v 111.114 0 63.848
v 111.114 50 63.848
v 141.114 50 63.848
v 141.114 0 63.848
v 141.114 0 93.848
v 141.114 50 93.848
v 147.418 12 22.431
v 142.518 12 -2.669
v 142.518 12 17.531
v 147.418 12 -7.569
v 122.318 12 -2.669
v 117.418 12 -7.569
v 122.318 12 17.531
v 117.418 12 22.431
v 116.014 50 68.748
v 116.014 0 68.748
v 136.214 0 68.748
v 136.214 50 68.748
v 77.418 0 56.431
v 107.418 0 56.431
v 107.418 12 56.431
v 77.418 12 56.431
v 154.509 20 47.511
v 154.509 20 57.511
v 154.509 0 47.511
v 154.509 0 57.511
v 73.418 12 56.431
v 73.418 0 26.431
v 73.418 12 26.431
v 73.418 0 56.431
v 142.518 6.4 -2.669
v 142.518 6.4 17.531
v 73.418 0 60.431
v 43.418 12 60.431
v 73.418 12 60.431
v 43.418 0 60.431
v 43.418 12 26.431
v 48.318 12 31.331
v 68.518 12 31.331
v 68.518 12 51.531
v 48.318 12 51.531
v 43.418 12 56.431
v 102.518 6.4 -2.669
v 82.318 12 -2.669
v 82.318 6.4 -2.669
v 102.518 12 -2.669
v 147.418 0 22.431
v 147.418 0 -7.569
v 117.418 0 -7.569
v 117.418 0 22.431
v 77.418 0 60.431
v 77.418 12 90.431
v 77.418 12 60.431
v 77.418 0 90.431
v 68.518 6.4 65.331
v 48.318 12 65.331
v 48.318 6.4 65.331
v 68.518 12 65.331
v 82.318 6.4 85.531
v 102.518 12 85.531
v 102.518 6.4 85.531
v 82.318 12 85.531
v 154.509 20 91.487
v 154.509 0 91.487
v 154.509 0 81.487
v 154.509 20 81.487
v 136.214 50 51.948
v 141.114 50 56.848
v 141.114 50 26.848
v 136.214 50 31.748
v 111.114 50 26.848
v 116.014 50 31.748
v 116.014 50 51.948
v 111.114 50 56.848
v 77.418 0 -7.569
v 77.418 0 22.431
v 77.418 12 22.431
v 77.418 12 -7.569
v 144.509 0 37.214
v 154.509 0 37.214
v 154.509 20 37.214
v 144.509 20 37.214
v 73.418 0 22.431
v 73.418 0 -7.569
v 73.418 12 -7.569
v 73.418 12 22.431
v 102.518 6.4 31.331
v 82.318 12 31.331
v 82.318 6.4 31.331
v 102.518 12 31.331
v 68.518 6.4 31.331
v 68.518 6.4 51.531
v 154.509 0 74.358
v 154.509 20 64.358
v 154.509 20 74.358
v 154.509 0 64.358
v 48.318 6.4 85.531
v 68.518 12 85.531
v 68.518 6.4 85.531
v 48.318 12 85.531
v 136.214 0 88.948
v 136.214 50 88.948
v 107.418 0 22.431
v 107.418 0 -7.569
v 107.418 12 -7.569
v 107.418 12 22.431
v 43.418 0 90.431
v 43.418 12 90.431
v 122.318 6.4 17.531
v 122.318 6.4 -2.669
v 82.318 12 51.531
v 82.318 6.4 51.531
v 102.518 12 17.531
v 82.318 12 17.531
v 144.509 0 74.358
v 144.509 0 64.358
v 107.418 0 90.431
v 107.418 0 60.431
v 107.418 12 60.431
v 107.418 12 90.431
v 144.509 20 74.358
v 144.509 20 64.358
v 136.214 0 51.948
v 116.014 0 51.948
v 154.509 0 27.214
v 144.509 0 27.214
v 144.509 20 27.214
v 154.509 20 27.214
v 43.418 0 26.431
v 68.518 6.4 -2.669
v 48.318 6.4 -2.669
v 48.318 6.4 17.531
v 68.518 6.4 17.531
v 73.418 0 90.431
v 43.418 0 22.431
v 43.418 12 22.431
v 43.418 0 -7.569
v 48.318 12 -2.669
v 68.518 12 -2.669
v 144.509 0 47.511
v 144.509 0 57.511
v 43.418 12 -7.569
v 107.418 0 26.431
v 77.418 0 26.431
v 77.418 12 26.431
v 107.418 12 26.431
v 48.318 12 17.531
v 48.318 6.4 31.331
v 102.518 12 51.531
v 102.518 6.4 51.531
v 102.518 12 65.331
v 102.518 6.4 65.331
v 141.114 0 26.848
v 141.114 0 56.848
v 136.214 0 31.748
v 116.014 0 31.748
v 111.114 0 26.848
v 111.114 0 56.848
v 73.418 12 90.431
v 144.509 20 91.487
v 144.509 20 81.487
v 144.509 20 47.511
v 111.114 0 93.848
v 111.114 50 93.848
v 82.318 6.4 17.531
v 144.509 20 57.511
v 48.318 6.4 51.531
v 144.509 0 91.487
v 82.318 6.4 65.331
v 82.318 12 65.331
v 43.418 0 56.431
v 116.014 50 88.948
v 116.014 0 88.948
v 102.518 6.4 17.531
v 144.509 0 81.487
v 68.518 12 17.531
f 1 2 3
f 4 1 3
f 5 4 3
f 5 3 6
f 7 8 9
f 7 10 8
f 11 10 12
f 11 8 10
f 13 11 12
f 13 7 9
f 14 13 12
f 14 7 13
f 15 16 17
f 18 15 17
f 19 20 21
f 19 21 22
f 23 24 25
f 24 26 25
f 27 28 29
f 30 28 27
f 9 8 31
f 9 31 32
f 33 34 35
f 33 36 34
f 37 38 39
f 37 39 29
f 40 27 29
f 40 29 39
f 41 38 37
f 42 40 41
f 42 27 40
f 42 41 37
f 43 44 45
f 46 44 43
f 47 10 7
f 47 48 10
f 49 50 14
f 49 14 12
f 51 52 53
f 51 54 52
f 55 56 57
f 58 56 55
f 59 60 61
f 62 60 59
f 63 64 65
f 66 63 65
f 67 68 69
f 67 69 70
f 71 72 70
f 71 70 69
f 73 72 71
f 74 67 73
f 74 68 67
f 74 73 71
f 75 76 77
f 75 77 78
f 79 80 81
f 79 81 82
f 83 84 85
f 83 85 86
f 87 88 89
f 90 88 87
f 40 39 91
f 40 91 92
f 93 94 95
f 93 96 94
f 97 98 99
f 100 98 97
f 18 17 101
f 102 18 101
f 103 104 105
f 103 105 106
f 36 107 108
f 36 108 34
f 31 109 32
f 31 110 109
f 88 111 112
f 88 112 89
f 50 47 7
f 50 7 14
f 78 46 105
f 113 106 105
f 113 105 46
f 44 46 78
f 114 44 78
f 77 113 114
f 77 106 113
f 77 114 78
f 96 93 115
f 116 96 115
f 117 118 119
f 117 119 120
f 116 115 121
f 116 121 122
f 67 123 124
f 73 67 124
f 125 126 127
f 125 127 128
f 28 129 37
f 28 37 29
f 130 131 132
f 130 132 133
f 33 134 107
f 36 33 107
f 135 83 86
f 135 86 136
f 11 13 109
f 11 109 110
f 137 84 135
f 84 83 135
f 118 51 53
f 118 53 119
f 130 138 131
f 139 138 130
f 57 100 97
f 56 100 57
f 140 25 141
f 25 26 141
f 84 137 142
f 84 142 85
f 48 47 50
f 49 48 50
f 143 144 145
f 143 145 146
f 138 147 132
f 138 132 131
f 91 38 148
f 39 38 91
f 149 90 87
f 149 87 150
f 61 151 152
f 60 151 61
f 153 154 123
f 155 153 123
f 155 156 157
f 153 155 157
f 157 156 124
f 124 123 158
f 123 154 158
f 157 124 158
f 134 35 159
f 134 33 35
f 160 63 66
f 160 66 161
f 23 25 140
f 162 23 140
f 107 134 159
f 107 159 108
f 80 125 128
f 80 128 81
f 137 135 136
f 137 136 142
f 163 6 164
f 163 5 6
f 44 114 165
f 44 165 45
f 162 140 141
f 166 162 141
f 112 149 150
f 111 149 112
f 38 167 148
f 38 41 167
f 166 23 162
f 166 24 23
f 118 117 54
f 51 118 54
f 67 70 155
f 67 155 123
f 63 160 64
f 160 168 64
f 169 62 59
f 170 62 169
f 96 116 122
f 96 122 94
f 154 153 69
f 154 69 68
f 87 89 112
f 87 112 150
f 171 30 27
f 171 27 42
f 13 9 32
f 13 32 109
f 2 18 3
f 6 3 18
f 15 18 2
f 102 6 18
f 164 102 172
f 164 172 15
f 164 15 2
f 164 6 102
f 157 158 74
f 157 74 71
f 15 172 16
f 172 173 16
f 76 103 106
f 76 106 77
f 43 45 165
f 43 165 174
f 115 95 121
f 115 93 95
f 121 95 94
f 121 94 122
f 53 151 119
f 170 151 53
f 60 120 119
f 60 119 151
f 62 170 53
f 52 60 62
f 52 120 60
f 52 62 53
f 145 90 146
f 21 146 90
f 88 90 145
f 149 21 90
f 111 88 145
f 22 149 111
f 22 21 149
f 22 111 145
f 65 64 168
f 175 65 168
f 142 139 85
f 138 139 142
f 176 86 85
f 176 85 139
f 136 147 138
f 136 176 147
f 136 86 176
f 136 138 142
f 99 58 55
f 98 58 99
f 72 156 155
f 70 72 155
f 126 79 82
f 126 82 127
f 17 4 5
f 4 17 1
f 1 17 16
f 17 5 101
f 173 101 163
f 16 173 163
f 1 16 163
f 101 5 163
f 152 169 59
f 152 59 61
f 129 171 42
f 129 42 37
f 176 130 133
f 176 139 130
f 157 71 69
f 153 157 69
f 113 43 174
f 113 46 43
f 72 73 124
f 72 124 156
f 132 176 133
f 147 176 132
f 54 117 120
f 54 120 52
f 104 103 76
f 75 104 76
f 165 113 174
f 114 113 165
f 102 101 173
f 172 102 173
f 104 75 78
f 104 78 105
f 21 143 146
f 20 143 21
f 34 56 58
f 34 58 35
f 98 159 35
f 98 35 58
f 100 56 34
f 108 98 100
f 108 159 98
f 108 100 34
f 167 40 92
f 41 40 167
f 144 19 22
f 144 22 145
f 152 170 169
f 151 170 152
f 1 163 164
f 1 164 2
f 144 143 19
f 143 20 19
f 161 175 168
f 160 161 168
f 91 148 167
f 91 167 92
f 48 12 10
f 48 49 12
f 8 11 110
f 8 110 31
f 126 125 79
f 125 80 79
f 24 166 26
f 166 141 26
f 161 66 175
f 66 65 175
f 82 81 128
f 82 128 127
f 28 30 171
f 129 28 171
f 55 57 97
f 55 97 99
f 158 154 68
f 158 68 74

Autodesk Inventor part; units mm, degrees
ref_plane "YZ Plane" through (0, 0, 0) normal (1, 0, 0) x (0, 1, 0)
ref_plane "XZ Plane" through (0, 0, 0) normal (0, 1, 0) x (-1, 0, 0)
ref_plane "XY Plane" through (0, 0, 0) normal (0, 0, 1) x (1, 0, 0)
sketch "草圖1" plane through (0, 0, 0) normal (0, 1, 0) x (-1, 0, 0)
  circle A0 centre (0, 0) radius 7
  circle A1 centre (0, 0) radius 11
  line L0 (0, 0) -> (-26.517, 0)
  line L1 (0, 0) -> (0, 28.4195)
  circle A2 centre (-26, 0) radius 7
  circle A3 centre (-26, 0) radius 11
  circle A4 centre (0, 26) radius 7
  circle A5 centre (0, 26) radius 11
  circle A6 centre (-26, 26) radius 7
  circle A7 centre (-26, 26) radius 11
  dimension "d0" = 14
  dimension "d1" = 22
  dimension "d6" = 26
  dimension "d9" = 26
sketch "草圖2" plane through (0, 0, 0) normal (0, 1, 0) x (-1, 0, 0)
  line L0 (-43.4184, -7.5692) -> (-73.4184, -7.5692)
  line L1 (-73.4184, -7.5692) -> (-73.4184, 22.4308)
  line L2 (-73.4184, 22.4308) -> (-43.4184, 22.4308)
  line L3 (-43.4184, 22.4308) -> (-43.4184, -7.5692)
  point P0 (0, 0)
  dimension "d14" = 30
  dimension "d15" = 30
extrude "擠出3" add sketch "草圖2" along normal blind 12
sketch "草圖3" plane through (0, 12, 0) normal (0, 1, 0) x (1, 0, 0)
  line L0 (73.4184, -22.4308) -> (73.4184, 7.5692) projected
  line L1 (73.4184, 7.5692) -> (41.0142, -24.4308)
  line L2 (73.4184, 7.5692) -> (43.4184, 7.5692) projected
  line L3 (43.4184, 7.5692) -> (73.4184, -22.4308)
  line L4 (48.3184, 2.6692) -> (68.5184, 2.6692)
  line L5 (68.5184, 2.6692) -> (68.5184, -17.5308)
  line L6 (68.5184, -17.5308) -> (48.3184, -17.5308)
  line L7 (48.3184, -17.5308) -> (48.3184, 2.6692)
  line L8 (48.3184, 2.6692) -> (68.5184, -17.5308) construction
  line L9 (68.5184, 2.6692) -> (48.3184, -17.5308) construction
  point P0 (0, 0)
  point P1 (58.4184, -7.4308)
  dimension "d18" = 20.2
  dimension "d19" = 20.2
extrude "擠出4" cut sketch "草圖3" against normal blind 5.6 contours L6 L7 L1 L3 | L3 L1 L4 L5 | L1 L3 L4 | L1 L7 L3
pattern_linear "矩形陣列1" count 2 spacing 34 along (1, 0, 0) count 3 spacing 34 along (0, 0, 1) of "擠出3", "擠出4"
sketch "草圖6" plane through (0, 0, 0) normal (0, 1, 0) x (-1, 0, 0)
  point P0 (0, 0)
sketch "草圖9" plane through (0, 0, 0) normal (0, 1, 0) x (-1, 0, 0)
  line L0 (-111.1142, 26.8484) -> (-141.1142, 26.8484)
  line L1 (-141.1142, 26.8484) -> (-141.1142, 56.8484)
  line L2 (-141.1142, 56.8484) -> (-111.1142, 56.8484)
  line L3 (-111.1142, 56.8484) -> (-111.1142, 26.8484)
  line L4 (-116.0142, 31.7484) -> (-136.2142, 31.7484)
  line L5 (-136.2142, 31.7484) -> (-136.2142, 51.9484)
  line L6 (-136.2142, 51.9484) -> (-116.0142, 51.9484)
  line L7 (-116.0142, 51.9484) -> (-116.0142, 31.7484)
  line L8 (-116.0142, 31.7484) -> (-136.2142, 51.9484) construction
  line L9 (-136.2142, 31.7484) -> (-116.0142, 51.9484) construction
  line L10 (-111.1142, 63.8484) -> (-141.1142, 63.8484)
  line L11 (-141.1142, 63.8484) -> (-141.1142, 93.8484)
  line L12 (-141.1142, 93.8484) -> (-111.1142, 93.8484)
  line L13 (-111.1142, 93.8484) -> (-111.1142, 63.8484)
  line L14 (-116.0142, 68.7484) -> (-136.2142, 68.7484)
  line L15 (-136.2142, 68.7484) -> (-136.2142, 88.9484)
  line L16 (-136.2142, 88.9484) -> (-116.0142, 88.9484)
  line L17 (-116.0142, 88.9484) -> (-116.0142, 68.7484)
  line L18 (-116.0142, 68.7484) -> (-136.2142, 88.9484) construction
  line L19 (-136.2142, 68.7484) -> (-116.0142, 88.9484) construction
  line L20 (-1.9445, 119.2719) -> (-33.9445, 119.2719)
  line L21 (-33.9445, 119.2719) -> (-33.9445, 151.2719)
  line L22 (-33.9445, 151.2719) -> (-1.9445, 151.2719)
  line L23 (-1.9445, 151.2719) -> (-1.9445, 119.2719)
  line L24 (-5.9445, 123.2719) -> (-29.9445, 123.2719)
  line L25 (-29.9445, 123.2719) -> (-29.9445, 147.2719)
  line L26 (-29.9445, 147.2719) -> (-5.9445, 147.2719)
  line L27 (-5.9445, 147.2719) -> (-5.9445, 123.2719)
  line L28 (-5.9445, 119.5982) -> (-29.9445, 143.5982) construction
  line L29 (-29.9445, 119.5982) -> (-5.9445, 143.5982) construction
  line L30 (35.5473, 81.3984) -> (3.5473, 81.3984)
  line L31 (3.5473, 81.3984) -> (3.5473, 113.3984)
  line L32 (3.5473, 113.3984) -> (35.5473, 113.3984)
  line L33 (35.5473, 113.3984) -> (35.5473, 81.3984)
  line L34 (31.5472, 85.3984) -> (7.5472, 85.3984)
  line L35 (7.5472, 85.3984) -> (7.5472, 109.3984)
  line L36 (7.5472, 109.3984) -> (31.5472, 109.3984)
  line L37 (31.5472, 109.3984) -> (31.5472, 85.3984)
  line L38 (31.5472, 85.3984) -> (7.5472, 109.3984) construction
  line L39 (7.5472, 85.3984) -> (31.5472, 109.3984) construction
  line L40 (34.8593, 41.843) -> (2.8593, 41.843)
  line L41 (30.8593, 45.843) -> (6.8593, 45.843)
  line L42 (6.8593, 45.843) -> (6.8593, 69.843)
  line L43 (2.8593, 41.843) -> (2.8593, 73.843)
  line L44 (6.8593, 69.843) -> (30.8593, 69.843)
  line L45 (30.8593, 45.843) -> (6.8593, 69.843) construction
  line L46 (6.8593, 45.843) -> (30.8593, 69.843) construction
  line L47 (2.8593, 73.843) -> (34.8593, 73.843)
  line L48 (30.8593, 69.843) -> (30.8593, 45.843)
  line L49 (34.8593, 73.843) -> (34.8593, 41.843)
  line L50 (35.5473, 117.4293) -> (3.5473, 117.4293)
  line L51 (31.5472, 121.4294) -> (7.5472, 121.4294)
  line L52 (7.5472, 121.4294) -> (7.5472, 145.4294)
  line L53 (3.5473, 117.4293) -> (3.5473, 149.4293)
  line L54 (7.5472, 145.4294) -> (31.5472, 145.4294)
  line L55 (31.5472, 121.4294) -> (7.5472, 145.4294) construction
  line L56 (7.5472, 121.4294) -> (31.5472, 145.4294) construction
  line L57 (3.5473, 149.4293) -> (35.5473, 149.4293)
  line L58 (31.5472, 145.4294) -> (31.5472, 121.4294)
  line L59 (35.5473, 149.4293) -> (35.5473, 117.4293)
  line L60 (-40.805, 141.4327) -> (-72.805, 141.4327)
  line L61 (-44.805, 145.4328) -> (-68.805, 145.4328)
  line L62 (-68.805, 145.4328) -> (-68.805, 169.4328)
  line L63 (-72.805, 141.4327) -> (-72.805, 173.4327)
  line L64 (-68.805, 169.4328) -> (-44.805, 169.4328)
  line L65 (-44.805, 145.4328) -> (-68.805, 169.4328) construction
  line L66 (-68.805, 145.4328) -> (-44.805, 169.4328) construction
  line L67 (-72.805, 173.4327) -> (-40.805, 173.4327)
  line L68 (-44.805, 169.4328) -> (-44.805, 145.4328)
  line L69 (-40.805, 173.4327) -> (-40.805, 141.4327)
  line L70 (-81.8163, 139.4435) -> (-113.8163, 139.4435)
  line L71 (-85.8164, 143.4436) -> (-109.8164, 143.4436)
  line L72 (-109.8164, 143.4436) -> (-109.8164, 167.4436)
  line L73 (-113.8163, 139.4435) -> (-113.8163, 171.4435)
  line L74 (-109.8164, 167.4436) -> (-85.8164, 167.4436)
  line L75 (-85.8164, 143.4436) -> (-109.8164, 167.4436) construction
  line L76 (-109.8164, 143.4436) -> (-85.8164, 167.4436) construction
  line L77 (-113.8163, 171.4435) -> (-81.8163, 171.4435)
  line L78 (-85.8164, 167.4436) -> (-85.8164, 143.4436)
  line L79 (-81.8163, 171.4435) -> (-81.8163, 139.4435)
  point P0 (0, 0)
  point P1 (-126.1142, 41.8484)
  point P2 (-126.1142, 78.8484)
  point P3 (-17.9445, 131.5982)
  point P4 (19.5472, 97.3984)
  point P5 (18.8593, 57.843)
  point P6 (19.5472, 133.4294)
  point P7 (-56.805, 157.4328)
  point P8 (-97.8164, 155.4436)
  dimension "d73" = 50.747
  dimension "d54" = 30
  dimension "d55" = 30
  dimension "d56" = 20.2
  dimension "d57" = 20.2
  dimension "d60" = 37
  dimension "d69" = 32
  dimension "d70" = 32
  dimension "d71" = 24
  dimension "d72" = 24
  dimension "d141" = 4.9
  dimension "d142" = 4.9
extrude "擠出9" add sketch "草圖9" along normal blind 50 contours L0 L1 L2 L3 | L10 L11 L12 L13
sketch "草圖10" plane through (0, 0, 0) normal (0, 1, 0) x (-1, 0, 0)
  line L0 (48.2716, 184.5725) -> (-274.6912, 184.5725)
  line L1 (-274.6912, 184.5725) -> (-274.6912, -18.9692)
  line L2 (-274.6912, -18.9692) -> (48.2716, -18.9692)
  line L3 (48.2716, -18.9692) -> (48.2716, 184.5725)
  line L4 (48.2716, -18.9692) -> (-71.7284, -18.9692)
  line L5 (-71.7284, -18.9692) -> (-71.7284, 101.0308)
  line L6 (-71.7284, 101.0308) -> (48.2716, 101.0308)
  line L7 (48.2716, 101.0308) -> (48.2716, -18.9692)
  line L8 (-71.7284, -18.9692) -> (-191.7284, -18.9692)
  line L9 (-191.7284, -18.9692) -> (-191.7284, 101.0308)
  line L10 (-191.7284, 101.0308) -> (-71.7284, 101.0308)
  line L11 (-71.7284, 101.0308) -> (-71.7284, -18.9692)
  point P0 (0, 0)
  dimension "d99" = 322.9628
  dimension "d100" = 203.5417
  dimension "d135" = 120
  dimension "d136" = 120
  dimension "d137" = 120
  dimension "d138" = 120
sketch "草圖11" plane through (0, 0, 0) normal (0, 1, 0) x (-1, 0, 0)
  line L0 (35.0654, 155.7952) -> (13.0654, 155.7952)
  line L1 (13.0654, 155.7952) -> (13.0654, 177.7952)
  line L2 (13.0654, 177.7952) -> (35.0654, 177.7952)
  line L3 (35.0654, 177.7952) -> (35.0654, 155.7952)
  line L4 (4.7905, 155.7952) -> (-17.2095, 155.7952)
  line L5 (-17.2095, 155.7952) -> (-17.2095, 177.7952)
  line L6 (-17.2095, 177.7952) -> (4.7905, 177.7952)
  line L7 (4.7905, 177.7952) -> (4.7905, 155.7952)
  point P0 (0, 0)
  dimension "d101" = 22
  dimension "d102" = 22
  dimension "d103" = 22
  dimension "d104" = 22
sketch "草圖12" plane through (0, 0, 0) normal (0, 1, 0) x (-1, 0, 0)
  line L0 (17.1987, 35.1037) -> (39.1987, 35.1037)
  line L1 (39.1987, 35.1037) -> (39.1987, 13.1037)
  line L2 (39.1987, 13.1037) -> (17.1987, 13.1037)
  line L3 (17.1987, 13.1037) -> (17.1987, 35.1037)
  line L4 (17.9153, 6.7257) -> (39.9153, 6.7257)
  line L5 (39.9153, 6.7257) -> (39.9153, -15.2743)
  line L6 (39.9153, -15.2743) -> (17.9153, -15.2743)
  line L7 (17.9153, -15.2743) -> (17.9153, 6.7257)
  point P0 (0, 0)
  dimension "d105" = 22
  dimension "d106" = 22
  dimension "d107" = 22
  dimension "d108" = 22
sketch "草圖14" plane through (0, 0, 0) normal (0, 1, 0) x (-1, 0, 0)
  line L0 (-154.5089, 57.5113) -> (-154.5089, 47.5113)
  line L1 (-154.5089, 47.5113) -> (-144.5089, 47.5113)
  line L2 (-144.5089, 47.5113) -> (-144.5089, 57.5113)
  line L3 (-144.5089, 57.5113) -> (-154.5089, 57.5113)
  line L4 (-154.5089, 27.2143) -> (-154.5089, 37.2143)
  line L5 (-154.5089, 37.2143) -> (-144.5089, 37.2143)
  line L6 (-144.5089, 37.2143) -> (-144.5089, 27.2143)
  line L7 (-144.5089, 27.2143) -> (-154.5089, 27.2143)
  line L8 (-154.5089, 91.4866) -> (-154.5089, 81.4866)
  line L9 (-154.5089, 81.4866) -> (-144.5089, 81.4866)
  line L10 (-144.5089, 81.4866) -> (-144.5089, 91.4866)
  line L11 (-144.5089, 91.4866) -> (-154.5089, 91.4866)
  line L12 (-154.5089, 64.3577) -> (-154.5089, 74.3577)
  line L13 (-154.5089, 74.3577) -> (-144.5089, 74.3577)
  line L14 (-144.5089, 74.3577) -> (-144.5089, 64.3577)
  line L15 (-144.5089, 64.3577) -> (-154.5089, 64.3577)
  point P0 (0, 0)
  dimension "d123" = 10
  dimension "d124" = 10
  dimension "d125" = 10
  dimension "d126" = 10
  dimension "d143" = 10
  dimension "d144" = 10
  dimension "d145" = 10
  dimension "d146" = 10
extrude "擠出14" add sketch "草圖14" along normal blind 20
pattern_linear "矩形陣列5" count 2 spacing 74 along (1, 0, 0) of "擠出3", "擠出4"
sketch "草圖15" plane through (0, 0, 0) normal (0, 1, 0) x (-1, 0, 0)
  line L0 (-141.1142, 56.8484) -> (-141.1142, 26.8484) projected
  line L1 (-40.5554, -10.4383) -> (-160.5554, -10.4383)
  line L2 (-160.5554, -10.4383) -> (-160.5554, 109.5617)
  line L3 (-160.5554, 109.5617) -> (-40.5554, 109.5617)
  line L4 (-40.5554, 109.5617) -> (-40.5554, -10.4383)
  point P0 (0, 0)
  dimension "d139" = 120
  dimension "d140" = 120
properties part number "axie1"
